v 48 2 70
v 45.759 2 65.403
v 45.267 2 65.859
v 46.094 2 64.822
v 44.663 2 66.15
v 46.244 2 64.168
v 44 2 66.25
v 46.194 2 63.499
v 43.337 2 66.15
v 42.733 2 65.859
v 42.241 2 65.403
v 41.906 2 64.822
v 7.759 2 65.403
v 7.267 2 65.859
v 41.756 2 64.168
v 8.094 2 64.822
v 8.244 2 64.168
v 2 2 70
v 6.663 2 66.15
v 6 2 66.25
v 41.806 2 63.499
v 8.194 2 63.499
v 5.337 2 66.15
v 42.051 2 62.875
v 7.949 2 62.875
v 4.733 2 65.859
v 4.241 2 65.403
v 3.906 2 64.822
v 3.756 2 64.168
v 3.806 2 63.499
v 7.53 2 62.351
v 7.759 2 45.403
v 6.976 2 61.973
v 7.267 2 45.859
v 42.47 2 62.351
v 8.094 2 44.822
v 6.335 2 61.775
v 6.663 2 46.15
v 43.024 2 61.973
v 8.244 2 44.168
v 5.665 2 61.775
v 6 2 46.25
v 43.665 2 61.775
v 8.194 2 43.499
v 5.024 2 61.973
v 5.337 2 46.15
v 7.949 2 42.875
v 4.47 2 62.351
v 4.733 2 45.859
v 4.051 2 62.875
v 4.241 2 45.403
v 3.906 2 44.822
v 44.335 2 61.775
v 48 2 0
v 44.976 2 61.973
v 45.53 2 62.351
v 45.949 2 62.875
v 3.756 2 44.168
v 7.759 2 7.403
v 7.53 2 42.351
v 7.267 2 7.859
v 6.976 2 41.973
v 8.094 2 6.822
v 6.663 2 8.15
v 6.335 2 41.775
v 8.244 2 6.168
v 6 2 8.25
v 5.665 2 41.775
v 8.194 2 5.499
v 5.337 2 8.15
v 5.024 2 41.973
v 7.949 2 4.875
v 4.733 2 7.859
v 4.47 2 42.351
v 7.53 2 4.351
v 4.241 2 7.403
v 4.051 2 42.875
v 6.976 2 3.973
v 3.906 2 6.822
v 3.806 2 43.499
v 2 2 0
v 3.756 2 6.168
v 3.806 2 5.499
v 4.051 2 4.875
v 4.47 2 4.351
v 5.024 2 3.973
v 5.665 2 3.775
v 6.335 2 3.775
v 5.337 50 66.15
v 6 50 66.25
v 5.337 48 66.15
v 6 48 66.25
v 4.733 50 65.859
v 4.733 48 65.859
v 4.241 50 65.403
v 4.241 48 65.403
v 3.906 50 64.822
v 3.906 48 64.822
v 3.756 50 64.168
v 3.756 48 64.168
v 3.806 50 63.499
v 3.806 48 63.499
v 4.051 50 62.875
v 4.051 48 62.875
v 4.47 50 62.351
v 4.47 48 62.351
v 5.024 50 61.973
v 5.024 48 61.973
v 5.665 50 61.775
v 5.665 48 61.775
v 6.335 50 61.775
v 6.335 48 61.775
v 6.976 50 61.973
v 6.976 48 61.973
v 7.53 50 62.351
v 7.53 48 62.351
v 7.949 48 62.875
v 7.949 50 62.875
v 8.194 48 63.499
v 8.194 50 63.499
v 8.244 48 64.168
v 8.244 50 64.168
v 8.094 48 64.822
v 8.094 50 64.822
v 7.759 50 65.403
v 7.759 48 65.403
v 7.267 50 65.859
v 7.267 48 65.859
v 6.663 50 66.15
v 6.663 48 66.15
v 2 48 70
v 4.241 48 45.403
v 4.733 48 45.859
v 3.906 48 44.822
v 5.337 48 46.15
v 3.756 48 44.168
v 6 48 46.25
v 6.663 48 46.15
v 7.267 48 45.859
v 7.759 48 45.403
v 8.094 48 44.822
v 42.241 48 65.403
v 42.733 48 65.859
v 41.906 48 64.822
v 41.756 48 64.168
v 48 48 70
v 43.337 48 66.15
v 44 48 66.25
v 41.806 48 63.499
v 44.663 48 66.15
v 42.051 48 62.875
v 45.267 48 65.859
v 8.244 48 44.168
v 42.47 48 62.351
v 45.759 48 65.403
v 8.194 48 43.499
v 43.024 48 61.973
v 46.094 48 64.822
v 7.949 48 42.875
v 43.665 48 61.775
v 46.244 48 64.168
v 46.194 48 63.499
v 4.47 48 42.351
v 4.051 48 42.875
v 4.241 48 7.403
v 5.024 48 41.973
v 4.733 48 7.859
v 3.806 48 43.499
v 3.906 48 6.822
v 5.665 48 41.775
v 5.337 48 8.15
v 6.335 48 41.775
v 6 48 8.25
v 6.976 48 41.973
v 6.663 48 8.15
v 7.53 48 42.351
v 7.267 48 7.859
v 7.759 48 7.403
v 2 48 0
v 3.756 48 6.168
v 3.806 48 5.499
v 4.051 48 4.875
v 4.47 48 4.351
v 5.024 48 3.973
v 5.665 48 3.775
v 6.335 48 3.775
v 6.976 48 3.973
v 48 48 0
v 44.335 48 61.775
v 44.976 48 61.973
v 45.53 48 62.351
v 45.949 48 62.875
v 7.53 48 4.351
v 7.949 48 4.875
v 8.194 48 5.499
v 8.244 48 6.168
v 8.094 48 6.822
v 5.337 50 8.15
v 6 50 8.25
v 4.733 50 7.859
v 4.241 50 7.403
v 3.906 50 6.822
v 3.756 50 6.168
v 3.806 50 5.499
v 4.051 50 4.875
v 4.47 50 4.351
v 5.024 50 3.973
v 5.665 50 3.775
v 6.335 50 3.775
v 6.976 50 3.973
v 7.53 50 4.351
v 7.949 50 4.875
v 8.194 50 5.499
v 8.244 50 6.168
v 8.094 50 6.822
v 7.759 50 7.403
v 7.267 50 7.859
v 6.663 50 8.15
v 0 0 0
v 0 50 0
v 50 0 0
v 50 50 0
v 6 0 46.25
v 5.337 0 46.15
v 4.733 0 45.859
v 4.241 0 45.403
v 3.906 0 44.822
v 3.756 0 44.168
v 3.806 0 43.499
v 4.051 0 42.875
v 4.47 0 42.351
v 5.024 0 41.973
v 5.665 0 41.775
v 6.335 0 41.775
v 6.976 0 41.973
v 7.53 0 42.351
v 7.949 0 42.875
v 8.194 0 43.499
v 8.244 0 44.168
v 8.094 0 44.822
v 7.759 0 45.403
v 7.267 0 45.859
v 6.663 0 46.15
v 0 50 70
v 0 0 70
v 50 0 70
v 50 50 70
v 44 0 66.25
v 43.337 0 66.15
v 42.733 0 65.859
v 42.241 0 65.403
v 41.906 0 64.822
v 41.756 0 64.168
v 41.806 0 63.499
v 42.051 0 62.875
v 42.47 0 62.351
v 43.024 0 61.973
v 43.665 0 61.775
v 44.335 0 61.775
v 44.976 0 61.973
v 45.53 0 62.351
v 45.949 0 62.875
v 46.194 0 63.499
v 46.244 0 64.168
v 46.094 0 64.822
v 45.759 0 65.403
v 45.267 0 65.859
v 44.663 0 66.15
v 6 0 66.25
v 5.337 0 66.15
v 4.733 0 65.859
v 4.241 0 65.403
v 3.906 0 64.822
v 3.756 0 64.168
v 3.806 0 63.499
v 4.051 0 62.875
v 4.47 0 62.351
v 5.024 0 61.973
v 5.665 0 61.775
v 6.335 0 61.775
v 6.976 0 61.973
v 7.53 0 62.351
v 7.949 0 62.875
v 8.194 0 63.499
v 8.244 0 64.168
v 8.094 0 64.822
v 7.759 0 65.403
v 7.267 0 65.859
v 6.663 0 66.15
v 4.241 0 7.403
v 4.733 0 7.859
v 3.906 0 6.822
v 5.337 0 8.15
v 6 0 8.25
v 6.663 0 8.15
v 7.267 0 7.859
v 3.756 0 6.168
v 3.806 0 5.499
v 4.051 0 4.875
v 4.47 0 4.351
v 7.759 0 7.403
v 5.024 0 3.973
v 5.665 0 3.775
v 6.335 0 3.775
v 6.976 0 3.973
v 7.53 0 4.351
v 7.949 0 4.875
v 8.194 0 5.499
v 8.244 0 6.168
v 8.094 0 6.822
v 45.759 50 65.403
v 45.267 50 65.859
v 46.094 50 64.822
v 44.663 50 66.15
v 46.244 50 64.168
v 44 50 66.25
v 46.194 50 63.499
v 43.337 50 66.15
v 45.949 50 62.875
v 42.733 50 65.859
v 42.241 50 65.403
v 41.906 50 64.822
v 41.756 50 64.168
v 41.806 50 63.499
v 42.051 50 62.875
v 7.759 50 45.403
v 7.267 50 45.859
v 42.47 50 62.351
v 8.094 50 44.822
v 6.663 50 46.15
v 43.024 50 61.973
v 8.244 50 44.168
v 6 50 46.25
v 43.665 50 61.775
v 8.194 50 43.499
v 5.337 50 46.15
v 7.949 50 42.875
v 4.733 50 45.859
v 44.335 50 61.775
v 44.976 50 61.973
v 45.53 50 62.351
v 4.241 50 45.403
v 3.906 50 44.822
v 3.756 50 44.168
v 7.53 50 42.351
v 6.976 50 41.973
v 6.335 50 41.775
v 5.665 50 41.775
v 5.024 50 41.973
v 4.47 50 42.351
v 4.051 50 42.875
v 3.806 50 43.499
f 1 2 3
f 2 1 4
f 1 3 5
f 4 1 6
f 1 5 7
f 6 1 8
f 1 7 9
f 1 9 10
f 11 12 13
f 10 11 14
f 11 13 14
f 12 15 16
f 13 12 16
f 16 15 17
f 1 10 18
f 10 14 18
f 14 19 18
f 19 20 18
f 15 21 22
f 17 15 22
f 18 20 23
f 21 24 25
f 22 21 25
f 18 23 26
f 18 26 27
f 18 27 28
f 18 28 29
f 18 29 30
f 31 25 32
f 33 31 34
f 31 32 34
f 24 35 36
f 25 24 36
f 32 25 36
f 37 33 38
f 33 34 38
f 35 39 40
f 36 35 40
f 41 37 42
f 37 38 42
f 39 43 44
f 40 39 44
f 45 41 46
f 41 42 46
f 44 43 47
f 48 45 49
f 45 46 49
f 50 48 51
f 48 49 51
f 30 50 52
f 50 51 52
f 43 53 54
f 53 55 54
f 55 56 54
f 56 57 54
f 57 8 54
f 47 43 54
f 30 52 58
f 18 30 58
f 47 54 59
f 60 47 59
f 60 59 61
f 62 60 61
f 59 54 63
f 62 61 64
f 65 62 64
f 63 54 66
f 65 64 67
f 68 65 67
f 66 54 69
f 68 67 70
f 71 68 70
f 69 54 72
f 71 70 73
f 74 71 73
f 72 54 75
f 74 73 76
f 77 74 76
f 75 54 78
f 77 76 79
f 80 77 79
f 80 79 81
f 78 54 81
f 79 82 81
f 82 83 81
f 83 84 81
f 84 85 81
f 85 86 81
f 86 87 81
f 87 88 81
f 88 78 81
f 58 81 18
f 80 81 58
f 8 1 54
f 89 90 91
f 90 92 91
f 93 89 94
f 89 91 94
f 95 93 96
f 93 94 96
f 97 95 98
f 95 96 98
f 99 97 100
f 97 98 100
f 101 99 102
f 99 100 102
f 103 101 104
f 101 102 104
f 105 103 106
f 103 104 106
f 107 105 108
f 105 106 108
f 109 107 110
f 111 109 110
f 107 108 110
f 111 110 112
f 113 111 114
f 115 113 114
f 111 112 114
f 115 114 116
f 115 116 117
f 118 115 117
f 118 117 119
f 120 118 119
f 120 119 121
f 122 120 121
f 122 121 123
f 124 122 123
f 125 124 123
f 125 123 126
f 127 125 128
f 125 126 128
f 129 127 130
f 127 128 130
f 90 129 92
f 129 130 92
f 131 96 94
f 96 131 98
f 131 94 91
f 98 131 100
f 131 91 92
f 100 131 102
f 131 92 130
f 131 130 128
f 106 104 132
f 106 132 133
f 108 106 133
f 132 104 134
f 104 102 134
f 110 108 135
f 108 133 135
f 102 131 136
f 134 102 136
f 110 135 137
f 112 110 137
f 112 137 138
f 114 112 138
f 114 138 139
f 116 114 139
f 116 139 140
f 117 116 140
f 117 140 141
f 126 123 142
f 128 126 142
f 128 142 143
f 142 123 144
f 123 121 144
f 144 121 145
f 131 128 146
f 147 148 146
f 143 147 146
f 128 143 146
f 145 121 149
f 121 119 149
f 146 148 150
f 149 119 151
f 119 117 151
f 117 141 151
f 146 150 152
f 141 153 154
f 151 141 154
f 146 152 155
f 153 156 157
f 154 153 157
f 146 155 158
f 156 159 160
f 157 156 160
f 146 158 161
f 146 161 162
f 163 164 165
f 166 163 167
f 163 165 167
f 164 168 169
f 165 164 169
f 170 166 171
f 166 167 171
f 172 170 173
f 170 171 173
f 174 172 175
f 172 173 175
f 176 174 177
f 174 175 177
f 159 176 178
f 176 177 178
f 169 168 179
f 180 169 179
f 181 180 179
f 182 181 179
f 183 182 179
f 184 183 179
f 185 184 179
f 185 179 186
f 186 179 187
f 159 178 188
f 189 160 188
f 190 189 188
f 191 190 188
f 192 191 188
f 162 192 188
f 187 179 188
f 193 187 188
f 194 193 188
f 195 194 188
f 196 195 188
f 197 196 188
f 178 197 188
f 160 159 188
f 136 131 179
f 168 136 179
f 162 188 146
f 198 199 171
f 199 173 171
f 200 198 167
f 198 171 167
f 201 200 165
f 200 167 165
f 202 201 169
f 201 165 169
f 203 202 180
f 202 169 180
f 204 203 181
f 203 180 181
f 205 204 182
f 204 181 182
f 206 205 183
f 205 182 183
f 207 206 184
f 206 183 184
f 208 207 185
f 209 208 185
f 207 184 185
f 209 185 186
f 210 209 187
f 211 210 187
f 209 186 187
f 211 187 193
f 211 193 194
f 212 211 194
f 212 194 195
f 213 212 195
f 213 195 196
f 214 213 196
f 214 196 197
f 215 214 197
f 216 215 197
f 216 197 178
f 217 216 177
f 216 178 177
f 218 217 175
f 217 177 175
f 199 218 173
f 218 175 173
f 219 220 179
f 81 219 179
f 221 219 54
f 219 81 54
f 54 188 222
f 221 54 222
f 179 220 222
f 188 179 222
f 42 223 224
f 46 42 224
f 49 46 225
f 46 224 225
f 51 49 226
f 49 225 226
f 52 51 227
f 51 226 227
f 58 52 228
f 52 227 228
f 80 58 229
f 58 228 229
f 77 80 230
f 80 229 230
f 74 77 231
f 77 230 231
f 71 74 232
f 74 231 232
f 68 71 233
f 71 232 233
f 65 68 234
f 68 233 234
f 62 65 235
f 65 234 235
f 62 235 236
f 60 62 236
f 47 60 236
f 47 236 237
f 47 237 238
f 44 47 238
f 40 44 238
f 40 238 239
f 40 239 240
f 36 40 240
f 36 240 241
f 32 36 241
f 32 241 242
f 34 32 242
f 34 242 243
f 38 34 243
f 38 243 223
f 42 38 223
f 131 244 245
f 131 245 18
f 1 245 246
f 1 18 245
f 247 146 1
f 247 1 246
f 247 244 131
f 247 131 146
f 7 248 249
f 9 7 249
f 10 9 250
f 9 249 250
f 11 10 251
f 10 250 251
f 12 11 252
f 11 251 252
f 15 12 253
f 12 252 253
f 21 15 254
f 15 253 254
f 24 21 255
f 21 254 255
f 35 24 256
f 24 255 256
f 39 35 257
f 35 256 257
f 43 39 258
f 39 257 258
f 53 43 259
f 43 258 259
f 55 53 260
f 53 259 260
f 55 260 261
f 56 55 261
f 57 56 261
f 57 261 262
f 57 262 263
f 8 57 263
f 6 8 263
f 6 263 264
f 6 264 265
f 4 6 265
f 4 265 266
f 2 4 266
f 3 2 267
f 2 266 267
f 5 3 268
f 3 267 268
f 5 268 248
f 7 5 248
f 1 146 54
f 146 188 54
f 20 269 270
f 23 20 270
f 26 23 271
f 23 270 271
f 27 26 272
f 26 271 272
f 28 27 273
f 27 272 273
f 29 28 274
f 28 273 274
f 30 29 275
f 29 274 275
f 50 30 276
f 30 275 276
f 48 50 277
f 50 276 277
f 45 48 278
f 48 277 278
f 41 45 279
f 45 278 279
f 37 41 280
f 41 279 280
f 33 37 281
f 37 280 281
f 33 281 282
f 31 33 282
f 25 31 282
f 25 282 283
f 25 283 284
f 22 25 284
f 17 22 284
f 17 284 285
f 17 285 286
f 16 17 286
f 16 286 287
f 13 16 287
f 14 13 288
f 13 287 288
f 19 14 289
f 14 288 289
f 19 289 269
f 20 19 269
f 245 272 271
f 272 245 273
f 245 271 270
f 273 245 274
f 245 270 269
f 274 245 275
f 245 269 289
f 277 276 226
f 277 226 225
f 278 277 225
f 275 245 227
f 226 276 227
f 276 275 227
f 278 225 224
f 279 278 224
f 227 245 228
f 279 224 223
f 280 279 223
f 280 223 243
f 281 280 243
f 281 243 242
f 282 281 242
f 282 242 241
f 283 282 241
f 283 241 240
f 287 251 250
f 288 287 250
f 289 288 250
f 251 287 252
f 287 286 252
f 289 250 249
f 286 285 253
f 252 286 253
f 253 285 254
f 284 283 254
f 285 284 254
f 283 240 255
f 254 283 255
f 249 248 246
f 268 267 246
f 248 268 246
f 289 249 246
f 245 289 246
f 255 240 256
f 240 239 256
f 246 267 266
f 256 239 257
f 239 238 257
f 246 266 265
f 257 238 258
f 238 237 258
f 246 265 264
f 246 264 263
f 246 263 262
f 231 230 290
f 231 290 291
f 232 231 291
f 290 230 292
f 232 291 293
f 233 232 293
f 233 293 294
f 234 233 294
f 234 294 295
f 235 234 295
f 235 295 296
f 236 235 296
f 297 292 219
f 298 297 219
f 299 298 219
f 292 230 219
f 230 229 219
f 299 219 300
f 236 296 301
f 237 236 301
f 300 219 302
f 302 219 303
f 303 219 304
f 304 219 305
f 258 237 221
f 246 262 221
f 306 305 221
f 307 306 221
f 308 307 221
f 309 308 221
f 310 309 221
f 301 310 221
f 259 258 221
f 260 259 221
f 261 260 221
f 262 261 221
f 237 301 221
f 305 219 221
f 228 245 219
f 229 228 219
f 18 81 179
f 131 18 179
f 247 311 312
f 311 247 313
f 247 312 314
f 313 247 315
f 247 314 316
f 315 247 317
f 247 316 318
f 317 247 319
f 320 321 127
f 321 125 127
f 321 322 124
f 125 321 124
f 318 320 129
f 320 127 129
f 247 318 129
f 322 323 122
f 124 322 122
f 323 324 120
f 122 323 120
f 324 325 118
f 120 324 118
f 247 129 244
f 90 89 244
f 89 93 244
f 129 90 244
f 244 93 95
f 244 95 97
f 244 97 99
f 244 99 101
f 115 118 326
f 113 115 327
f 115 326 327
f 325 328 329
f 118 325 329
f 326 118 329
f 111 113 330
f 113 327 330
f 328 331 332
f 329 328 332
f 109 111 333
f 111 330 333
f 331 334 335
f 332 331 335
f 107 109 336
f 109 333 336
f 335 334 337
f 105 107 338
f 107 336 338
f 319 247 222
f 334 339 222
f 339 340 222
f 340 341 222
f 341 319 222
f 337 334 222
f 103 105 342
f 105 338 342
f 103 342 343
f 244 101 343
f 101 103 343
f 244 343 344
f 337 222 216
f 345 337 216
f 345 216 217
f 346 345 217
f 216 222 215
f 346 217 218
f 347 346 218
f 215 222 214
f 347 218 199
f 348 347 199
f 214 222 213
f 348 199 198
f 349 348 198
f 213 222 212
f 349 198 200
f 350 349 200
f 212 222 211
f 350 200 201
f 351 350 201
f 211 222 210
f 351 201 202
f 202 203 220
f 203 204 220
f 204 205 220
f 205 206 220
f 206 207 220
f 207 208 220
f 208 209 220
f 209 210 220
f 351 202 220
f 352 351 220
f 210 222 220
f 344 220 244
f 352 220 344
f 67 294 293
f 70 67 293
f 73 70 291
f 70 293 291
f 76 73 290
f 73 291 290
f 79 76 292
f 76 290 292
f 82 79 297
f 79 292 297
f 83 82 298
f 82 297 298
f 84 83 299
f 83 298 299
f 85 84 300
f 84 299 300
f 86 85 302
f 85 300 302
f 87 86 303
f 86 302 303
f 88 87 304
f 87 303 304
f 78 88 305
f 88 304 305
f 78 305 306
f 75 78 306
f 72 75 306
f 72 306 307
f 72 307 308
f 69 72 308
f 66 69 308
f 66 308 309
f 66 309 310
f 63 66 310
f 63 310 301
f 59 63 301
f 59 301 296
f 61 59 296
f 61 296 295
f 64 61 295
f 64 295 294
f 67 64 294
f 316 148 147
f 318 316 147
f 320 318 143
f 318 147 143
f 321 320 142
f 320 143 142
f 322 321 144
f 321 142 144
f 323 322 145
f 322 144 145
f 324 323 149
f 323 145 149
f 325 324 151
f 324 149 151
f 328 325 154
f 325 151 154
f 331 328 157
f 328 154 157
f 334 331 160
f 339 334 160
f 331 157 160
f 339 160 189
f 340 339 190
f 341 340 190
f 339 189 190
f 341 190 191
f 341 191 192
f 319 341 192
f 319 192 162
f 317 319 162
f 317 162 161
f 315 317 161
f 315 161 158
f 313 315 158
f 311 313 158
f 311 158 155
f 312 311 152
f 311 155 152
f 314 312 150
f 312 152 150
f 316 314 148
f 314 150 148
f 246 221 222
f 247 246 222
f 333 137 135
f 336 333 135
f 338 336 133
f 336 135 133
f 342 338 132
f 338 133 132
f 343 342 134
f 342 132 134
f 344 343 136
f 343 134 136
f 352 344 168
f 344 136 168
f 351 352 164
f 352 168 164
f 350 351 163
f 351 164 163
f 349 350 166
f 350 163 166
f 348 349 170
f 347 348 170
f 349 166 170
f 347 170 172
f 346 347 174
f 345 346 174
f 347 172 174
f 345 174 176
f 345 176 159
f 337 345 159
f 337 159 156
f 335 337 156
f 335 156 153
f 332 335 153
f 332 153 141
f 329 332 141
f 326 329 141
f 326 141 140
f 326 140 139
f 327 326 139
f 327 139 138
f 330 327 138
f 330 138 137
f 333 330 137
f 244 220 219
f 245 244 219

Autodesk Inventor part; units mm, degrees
ref_plane "YZ Plane" through (0, 0, 0) normal (1, 0, 0) x (0, 1, 0)
ref_plane "XZ Plane" through (0, 0, 0) normal (0, 1, 0) x (-1, 0, 0)
ref_plane "XY Plane" through (0, 0, 0) normal (0, 0, 1) x (1, 0, 0)
sketch "スケッチ1" plane through (0, 0, 0) normal (0, 0, 1) x (1, 0, 0)
  line L0 (0, 0) -> (50, 0)
  line L1 (50, 0) -> (50, 50)
  line L2 (50, 50) -> (0, 50)
  line L3 (0, 50) -> (0, 0)
  line L4 (2, 48) -> (48, 48)
  line L5 (48, 48) -> (48, 2)
  line L6 (48, 2) -> (2, 2)
  line L7 (2, 2) -> (2, 48)
  dimension "d0" = 50
  dimension "d1" = 50
  dimension "d2" = 2
extrude "押し出し1" add sketch "スケッチ1" along normal blind 70
sketch "スケッチ2" plane through (0, 50, 0) normal (0, 1, 0) x (1, 0, 0)
  line L0 (50, 0) -> (0, 0) projected
  line L1 (0, 0) -> (0, -70) projected
  line L2 (50, -70) -> (0, -70) projected
  line L3 (50, 0) -> (50, -70) projected
  line L4 (50, -64) -> (0, -64) construction
  point P0 (0, 0)
  point P1 (44, -64)
  point P2 (6, -64)
  dimension "d6" = 6
  dimension "d7" = 38
  dimension "d24" = 6
hole "穴1" at (44, 50, 64) at (6, 50, 64) direction (0, -1, 0) diameter 4.5 end through all
sketch "スケッチ4" plane through (0, 50, 0) normal (0, 1, 0) x (1, 0, 0)
  circle A0 centre (44, -64) radius 2.25 projected
  circle A1 centre (6, -64) radius 2.25 projected
  line L0 (50, 0) -> (0, 0) projected
  line L1 (0, 0) -> (0, -70) projected
  line L2 (50, -70) -> (0, -70) projected
  line L3 (50, 0) -> (50, -70) projected
  line L4 (6, -70) -> (6, 0) construction
  point P0 (0, 0)
  point P1 (6, -6)
  point P2 (6, -44)
  dimension "d25" = 6
  dimension "d26" = 6
  dimension "d27" = 38
hole "穴3" at (6, 50, 6) at (6, 50, 44) direction (0, -1, 0) diameter 4.5 end through all
properties part number "hip" material "アルミニウム 6061"
